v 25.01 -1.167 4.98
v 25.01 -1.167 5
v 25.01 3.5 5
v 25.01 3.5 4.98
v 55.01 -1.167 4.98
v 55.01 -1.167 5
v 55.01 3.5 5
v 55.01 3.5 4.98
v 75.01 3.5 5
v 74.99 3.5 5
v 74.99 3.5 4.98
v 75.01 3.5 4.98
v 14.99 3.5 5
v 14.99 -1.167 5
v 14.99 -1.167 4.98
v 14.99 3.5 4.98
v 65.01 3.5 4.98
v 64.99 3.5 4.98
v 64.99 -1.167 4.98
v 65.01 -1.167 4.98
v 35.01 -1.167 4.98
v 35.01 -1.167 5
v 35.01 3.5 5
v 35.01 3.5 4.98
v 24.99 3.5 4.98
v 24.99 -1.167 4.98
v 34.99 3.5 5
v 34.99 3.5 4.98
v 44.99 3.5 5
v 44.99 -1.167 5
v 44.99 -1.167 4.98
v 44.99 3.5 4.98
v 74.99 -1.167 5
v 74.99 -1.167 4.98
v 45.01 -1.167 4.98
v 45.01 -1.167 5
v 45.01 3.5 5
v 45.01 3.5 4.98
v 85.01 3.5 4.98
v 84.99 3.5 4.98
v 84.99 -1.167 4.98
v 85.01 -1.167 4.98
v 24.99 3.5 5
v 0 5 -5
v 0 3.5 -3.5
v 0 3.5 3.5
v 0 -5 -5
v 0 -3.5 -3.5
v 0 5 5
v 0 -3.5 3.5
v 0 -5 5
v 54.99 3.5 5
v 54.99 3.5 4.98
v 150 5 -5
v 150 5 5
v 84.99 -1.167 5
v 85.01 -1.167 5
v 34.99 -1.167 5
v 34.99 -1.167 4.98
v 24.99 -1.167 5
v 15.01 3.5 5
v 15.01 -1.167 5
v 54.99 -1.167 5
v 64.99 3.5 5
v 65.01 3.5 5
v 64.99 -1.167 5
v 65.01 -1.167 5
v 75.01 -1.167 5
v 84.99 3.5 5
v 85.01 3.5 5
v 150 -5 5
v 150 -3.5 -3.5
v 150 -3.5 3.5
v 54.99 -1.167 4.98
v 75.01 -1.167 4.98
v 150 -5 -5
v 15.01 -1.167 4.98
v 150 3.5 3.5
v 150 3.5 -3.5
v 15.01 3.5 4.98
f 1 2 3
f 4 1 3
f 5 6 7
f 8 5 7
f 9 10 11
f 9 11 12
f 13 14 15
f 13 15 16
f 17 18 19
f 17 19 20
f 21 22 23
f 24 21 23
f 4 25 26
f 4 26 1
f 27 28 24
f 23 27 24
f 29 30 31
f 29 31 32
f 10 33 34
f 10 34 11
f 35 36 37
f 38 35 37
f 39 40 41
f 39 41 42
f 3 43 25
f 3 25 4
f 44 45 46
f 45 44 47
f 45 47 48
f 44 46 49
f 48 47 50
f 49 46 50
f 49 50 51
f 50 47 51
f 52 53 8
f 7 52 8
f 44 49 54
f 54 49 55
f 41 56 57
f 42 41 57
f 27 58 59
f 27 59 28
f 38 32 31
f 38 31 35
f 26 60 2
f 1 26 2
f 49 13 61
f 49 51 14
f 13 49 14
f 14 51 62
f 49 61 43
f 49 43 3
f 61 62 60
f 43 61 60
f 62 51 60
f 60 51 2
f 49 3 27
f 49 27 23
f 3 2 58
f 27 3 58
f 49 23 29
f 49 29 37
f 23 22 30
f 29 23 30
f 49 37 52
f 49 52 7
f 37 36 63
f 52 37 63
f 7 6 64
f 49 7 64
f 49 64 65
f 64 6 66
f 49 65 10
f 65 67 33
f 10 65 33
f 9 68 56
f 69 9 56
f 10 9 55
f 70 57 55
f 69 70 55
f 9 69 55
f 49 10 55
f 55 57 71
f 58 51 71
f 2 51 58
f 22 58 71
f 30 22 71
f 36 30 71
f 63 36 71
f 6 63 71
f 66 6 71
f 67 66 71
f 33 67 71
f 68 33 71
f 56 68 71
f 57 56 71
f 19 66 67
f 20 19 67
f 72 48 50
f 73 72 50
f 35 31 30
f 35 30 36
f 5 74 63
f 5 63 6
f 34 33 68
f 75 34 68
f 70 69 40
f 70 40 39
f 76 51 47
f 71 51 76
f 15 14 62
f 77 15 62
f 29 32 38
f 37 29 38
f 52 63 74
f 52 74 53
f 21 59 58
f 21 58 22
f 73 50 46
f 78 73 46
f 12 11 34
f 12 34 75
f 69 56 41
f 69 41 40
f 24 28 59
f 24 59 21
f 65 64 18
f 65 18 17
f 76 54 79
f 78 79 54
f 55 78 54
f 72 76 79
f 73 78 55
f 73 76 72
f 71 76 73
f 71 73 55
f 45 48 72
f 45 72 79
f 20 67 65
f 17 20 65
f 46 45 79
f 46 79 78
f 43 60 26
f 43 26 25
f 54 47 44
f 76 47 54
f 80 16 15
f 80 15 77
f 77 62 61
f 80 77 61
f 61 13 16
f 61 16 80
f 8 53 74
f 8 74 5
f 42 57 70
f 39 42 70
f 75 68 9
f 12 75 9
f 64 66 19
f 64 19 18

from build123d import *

# Parameters (mm, degrees)
CROQUIS1_W              = 150
CROQUIS1_H              = 10
SALIENTE_EXTRUIR1_DEPTH = 10
CROQUIS2_W              = 7
CROQUIS2_H              = 7
CORTAR_EXTRUIR1_DEPTH   = 151.166574177
CROQUIS3_W              = 0.02
CROQUIS3_H              = 4.666666667
CORTAR_EXTRUIR2_DEPTH   = 0.02
CROQUIS4_W              = 0.02
CROQUIS4_H              = 4.666666667
CORTAR_EXTRUIR3_DEPTH   = 0.02
CROQUIS5_W              = 0.02
CROQUIS5_H              = 4.666666667
CORTAR_EXTRUIR4_DEPTH   = 0.02
CROQUIS6_W              = 0.02
CROQUIS6_H              = 4.666666667
CORTAR_EXTRUIR5_DEPTH   = 0.02
CROQUIS7_W              = 0.02
CROQUIS7_H              = 4.666666667
CORTAR_EXTRUIR6_DEPTH   = 0.02
CROQUIS8_W              = 0.02
CROQUIS8_H              = 4.666666667
CORTAR_EXTRUIR7_DEPTH   = 0.02
CROQUIS9_W              = 0.02
CROQUIS9_H              = 4.666666667
CORTAR_EXTRUIR8_DEPTH   = 0.02
CROQUIS10_W             = 0.02
CROQUIS10_H             = 4.666666667
CORTAR_EXTRUIR9_DEPTH   = 0.02


with BuildPart() as part:
    # Croquis1 → Saliente-Extruir1 (new body)
    with BuildSketch(Plane.XZ.offset(5)):
        with Locations((75, 0)):
            Rectangle(CROQUIS1_W, CROQUIS1_H)
    extrude(amount=-SALIENTE_EXTRUIR1_DEPTH)

    # Croquis2 → Cortar-Extruir1 (cut, through all)
    with BuildSketch(Plane.ZY):
        Rectangle(CROQUIS2_W, CROQUIS2_H)
    extrude(amount=-CORTAR_EXTRUIR1_DEPTH, mode=Mode.SUBTRACT)

    # Croquis3 → Cortar-Extruir2 (cut)
    with BuildSketch(Plane.XY.offset(5)):
        with Locations((25, 1.166666666)):
            Rectangle(CROQUIS3_W, CROQUIS3_H)
    extrude(amount=-CORTAR_EXTRUIR2_DEPTH, mode=Mode.SUBTRACT)

    # Croquis4 → Cortar-Extruir3 (cut)
    with BuildSketch(Plane.XY.offset(5)):
        with Locations((35, 1.166666666)):
            Rectangle(CROQUIS4_W, CROQUIS4_H)
    extrude(amount=-CORTAR_EXTRUIR3_DEPTH, mode=Mode.SUBTRACT)

    # Croquis5 → Cortar-Extruir4 (cut)
    with BuildSketch(Plane.XY.offset(5)):
        with Locations((45, 1.166666666)):
            Rectangle(CROQUIS5_W, CROQUIS5_H)
    extrude(amount=-CORTAR_EXTRUIR4_DEPTH, mode=Mode.SUBTRACT)

    # Croquis6 → Cortar-Extruir5 (cut)
    with BuildSketch(Plane.XY.offset(5)):
        with Locations((55, 1.166666666)):
            Rectangle(CROQUIS6_W, CROQUIS6_H)
    extrude(amount=-CORTAR_EXTRUIR5_DEPTH, mode=Mode.SUBTRACT)

    # Croquis7 → Cortar-Extruir6 (cut)
    with BuildSketch(Plane.XY.offset(5)):
        with Locations((65, 1.166666666)):
            Rectangle(CROQUIS7_W, CROQUIS7_H)
    extrude(amount=-CORTAR_EXTRUIR6_DEPTH, mode=Mode.SUBTRACT)

    # Croquis8 → Cortar-Extruir7 (cut)
    with BuildSketch(Plane.XY.offset(5)):
        with Locations((75, 1.166666666)):
            Rectangle(CROQUIS8_W, CROQUIS8_H)
    extrude(amount=-CORTAR_EXTRUIR7_DEPTH, mode=Mode.SUBTRACT)

    # Croquis9 → Cortar-Extruir8 (cut)
    with BuildSketch(Plane.XY.offset(5)):
        with Locations((85, 1.166666666)):
            Rectangle(CROQUIS9_W, CROQUIS9_H)
    extrude(amount=-CORTAR_EXTRUIR8_DEPTH, mode=Mode.SUBTRACT)

    # Croquis10 → Cortar-Extruir9 (cut)
    with BuildSketch(Plane.XY.offset(5)):
        with Locations((15, 1.166666666)):
            Rectangle(CROQUIS10_W, CROQUIS10_H)
    extrude(amount=-CORTAR_EXTRUIR9_DEPTH, mode=Mode.SUBTRACT)


solid = part.part
